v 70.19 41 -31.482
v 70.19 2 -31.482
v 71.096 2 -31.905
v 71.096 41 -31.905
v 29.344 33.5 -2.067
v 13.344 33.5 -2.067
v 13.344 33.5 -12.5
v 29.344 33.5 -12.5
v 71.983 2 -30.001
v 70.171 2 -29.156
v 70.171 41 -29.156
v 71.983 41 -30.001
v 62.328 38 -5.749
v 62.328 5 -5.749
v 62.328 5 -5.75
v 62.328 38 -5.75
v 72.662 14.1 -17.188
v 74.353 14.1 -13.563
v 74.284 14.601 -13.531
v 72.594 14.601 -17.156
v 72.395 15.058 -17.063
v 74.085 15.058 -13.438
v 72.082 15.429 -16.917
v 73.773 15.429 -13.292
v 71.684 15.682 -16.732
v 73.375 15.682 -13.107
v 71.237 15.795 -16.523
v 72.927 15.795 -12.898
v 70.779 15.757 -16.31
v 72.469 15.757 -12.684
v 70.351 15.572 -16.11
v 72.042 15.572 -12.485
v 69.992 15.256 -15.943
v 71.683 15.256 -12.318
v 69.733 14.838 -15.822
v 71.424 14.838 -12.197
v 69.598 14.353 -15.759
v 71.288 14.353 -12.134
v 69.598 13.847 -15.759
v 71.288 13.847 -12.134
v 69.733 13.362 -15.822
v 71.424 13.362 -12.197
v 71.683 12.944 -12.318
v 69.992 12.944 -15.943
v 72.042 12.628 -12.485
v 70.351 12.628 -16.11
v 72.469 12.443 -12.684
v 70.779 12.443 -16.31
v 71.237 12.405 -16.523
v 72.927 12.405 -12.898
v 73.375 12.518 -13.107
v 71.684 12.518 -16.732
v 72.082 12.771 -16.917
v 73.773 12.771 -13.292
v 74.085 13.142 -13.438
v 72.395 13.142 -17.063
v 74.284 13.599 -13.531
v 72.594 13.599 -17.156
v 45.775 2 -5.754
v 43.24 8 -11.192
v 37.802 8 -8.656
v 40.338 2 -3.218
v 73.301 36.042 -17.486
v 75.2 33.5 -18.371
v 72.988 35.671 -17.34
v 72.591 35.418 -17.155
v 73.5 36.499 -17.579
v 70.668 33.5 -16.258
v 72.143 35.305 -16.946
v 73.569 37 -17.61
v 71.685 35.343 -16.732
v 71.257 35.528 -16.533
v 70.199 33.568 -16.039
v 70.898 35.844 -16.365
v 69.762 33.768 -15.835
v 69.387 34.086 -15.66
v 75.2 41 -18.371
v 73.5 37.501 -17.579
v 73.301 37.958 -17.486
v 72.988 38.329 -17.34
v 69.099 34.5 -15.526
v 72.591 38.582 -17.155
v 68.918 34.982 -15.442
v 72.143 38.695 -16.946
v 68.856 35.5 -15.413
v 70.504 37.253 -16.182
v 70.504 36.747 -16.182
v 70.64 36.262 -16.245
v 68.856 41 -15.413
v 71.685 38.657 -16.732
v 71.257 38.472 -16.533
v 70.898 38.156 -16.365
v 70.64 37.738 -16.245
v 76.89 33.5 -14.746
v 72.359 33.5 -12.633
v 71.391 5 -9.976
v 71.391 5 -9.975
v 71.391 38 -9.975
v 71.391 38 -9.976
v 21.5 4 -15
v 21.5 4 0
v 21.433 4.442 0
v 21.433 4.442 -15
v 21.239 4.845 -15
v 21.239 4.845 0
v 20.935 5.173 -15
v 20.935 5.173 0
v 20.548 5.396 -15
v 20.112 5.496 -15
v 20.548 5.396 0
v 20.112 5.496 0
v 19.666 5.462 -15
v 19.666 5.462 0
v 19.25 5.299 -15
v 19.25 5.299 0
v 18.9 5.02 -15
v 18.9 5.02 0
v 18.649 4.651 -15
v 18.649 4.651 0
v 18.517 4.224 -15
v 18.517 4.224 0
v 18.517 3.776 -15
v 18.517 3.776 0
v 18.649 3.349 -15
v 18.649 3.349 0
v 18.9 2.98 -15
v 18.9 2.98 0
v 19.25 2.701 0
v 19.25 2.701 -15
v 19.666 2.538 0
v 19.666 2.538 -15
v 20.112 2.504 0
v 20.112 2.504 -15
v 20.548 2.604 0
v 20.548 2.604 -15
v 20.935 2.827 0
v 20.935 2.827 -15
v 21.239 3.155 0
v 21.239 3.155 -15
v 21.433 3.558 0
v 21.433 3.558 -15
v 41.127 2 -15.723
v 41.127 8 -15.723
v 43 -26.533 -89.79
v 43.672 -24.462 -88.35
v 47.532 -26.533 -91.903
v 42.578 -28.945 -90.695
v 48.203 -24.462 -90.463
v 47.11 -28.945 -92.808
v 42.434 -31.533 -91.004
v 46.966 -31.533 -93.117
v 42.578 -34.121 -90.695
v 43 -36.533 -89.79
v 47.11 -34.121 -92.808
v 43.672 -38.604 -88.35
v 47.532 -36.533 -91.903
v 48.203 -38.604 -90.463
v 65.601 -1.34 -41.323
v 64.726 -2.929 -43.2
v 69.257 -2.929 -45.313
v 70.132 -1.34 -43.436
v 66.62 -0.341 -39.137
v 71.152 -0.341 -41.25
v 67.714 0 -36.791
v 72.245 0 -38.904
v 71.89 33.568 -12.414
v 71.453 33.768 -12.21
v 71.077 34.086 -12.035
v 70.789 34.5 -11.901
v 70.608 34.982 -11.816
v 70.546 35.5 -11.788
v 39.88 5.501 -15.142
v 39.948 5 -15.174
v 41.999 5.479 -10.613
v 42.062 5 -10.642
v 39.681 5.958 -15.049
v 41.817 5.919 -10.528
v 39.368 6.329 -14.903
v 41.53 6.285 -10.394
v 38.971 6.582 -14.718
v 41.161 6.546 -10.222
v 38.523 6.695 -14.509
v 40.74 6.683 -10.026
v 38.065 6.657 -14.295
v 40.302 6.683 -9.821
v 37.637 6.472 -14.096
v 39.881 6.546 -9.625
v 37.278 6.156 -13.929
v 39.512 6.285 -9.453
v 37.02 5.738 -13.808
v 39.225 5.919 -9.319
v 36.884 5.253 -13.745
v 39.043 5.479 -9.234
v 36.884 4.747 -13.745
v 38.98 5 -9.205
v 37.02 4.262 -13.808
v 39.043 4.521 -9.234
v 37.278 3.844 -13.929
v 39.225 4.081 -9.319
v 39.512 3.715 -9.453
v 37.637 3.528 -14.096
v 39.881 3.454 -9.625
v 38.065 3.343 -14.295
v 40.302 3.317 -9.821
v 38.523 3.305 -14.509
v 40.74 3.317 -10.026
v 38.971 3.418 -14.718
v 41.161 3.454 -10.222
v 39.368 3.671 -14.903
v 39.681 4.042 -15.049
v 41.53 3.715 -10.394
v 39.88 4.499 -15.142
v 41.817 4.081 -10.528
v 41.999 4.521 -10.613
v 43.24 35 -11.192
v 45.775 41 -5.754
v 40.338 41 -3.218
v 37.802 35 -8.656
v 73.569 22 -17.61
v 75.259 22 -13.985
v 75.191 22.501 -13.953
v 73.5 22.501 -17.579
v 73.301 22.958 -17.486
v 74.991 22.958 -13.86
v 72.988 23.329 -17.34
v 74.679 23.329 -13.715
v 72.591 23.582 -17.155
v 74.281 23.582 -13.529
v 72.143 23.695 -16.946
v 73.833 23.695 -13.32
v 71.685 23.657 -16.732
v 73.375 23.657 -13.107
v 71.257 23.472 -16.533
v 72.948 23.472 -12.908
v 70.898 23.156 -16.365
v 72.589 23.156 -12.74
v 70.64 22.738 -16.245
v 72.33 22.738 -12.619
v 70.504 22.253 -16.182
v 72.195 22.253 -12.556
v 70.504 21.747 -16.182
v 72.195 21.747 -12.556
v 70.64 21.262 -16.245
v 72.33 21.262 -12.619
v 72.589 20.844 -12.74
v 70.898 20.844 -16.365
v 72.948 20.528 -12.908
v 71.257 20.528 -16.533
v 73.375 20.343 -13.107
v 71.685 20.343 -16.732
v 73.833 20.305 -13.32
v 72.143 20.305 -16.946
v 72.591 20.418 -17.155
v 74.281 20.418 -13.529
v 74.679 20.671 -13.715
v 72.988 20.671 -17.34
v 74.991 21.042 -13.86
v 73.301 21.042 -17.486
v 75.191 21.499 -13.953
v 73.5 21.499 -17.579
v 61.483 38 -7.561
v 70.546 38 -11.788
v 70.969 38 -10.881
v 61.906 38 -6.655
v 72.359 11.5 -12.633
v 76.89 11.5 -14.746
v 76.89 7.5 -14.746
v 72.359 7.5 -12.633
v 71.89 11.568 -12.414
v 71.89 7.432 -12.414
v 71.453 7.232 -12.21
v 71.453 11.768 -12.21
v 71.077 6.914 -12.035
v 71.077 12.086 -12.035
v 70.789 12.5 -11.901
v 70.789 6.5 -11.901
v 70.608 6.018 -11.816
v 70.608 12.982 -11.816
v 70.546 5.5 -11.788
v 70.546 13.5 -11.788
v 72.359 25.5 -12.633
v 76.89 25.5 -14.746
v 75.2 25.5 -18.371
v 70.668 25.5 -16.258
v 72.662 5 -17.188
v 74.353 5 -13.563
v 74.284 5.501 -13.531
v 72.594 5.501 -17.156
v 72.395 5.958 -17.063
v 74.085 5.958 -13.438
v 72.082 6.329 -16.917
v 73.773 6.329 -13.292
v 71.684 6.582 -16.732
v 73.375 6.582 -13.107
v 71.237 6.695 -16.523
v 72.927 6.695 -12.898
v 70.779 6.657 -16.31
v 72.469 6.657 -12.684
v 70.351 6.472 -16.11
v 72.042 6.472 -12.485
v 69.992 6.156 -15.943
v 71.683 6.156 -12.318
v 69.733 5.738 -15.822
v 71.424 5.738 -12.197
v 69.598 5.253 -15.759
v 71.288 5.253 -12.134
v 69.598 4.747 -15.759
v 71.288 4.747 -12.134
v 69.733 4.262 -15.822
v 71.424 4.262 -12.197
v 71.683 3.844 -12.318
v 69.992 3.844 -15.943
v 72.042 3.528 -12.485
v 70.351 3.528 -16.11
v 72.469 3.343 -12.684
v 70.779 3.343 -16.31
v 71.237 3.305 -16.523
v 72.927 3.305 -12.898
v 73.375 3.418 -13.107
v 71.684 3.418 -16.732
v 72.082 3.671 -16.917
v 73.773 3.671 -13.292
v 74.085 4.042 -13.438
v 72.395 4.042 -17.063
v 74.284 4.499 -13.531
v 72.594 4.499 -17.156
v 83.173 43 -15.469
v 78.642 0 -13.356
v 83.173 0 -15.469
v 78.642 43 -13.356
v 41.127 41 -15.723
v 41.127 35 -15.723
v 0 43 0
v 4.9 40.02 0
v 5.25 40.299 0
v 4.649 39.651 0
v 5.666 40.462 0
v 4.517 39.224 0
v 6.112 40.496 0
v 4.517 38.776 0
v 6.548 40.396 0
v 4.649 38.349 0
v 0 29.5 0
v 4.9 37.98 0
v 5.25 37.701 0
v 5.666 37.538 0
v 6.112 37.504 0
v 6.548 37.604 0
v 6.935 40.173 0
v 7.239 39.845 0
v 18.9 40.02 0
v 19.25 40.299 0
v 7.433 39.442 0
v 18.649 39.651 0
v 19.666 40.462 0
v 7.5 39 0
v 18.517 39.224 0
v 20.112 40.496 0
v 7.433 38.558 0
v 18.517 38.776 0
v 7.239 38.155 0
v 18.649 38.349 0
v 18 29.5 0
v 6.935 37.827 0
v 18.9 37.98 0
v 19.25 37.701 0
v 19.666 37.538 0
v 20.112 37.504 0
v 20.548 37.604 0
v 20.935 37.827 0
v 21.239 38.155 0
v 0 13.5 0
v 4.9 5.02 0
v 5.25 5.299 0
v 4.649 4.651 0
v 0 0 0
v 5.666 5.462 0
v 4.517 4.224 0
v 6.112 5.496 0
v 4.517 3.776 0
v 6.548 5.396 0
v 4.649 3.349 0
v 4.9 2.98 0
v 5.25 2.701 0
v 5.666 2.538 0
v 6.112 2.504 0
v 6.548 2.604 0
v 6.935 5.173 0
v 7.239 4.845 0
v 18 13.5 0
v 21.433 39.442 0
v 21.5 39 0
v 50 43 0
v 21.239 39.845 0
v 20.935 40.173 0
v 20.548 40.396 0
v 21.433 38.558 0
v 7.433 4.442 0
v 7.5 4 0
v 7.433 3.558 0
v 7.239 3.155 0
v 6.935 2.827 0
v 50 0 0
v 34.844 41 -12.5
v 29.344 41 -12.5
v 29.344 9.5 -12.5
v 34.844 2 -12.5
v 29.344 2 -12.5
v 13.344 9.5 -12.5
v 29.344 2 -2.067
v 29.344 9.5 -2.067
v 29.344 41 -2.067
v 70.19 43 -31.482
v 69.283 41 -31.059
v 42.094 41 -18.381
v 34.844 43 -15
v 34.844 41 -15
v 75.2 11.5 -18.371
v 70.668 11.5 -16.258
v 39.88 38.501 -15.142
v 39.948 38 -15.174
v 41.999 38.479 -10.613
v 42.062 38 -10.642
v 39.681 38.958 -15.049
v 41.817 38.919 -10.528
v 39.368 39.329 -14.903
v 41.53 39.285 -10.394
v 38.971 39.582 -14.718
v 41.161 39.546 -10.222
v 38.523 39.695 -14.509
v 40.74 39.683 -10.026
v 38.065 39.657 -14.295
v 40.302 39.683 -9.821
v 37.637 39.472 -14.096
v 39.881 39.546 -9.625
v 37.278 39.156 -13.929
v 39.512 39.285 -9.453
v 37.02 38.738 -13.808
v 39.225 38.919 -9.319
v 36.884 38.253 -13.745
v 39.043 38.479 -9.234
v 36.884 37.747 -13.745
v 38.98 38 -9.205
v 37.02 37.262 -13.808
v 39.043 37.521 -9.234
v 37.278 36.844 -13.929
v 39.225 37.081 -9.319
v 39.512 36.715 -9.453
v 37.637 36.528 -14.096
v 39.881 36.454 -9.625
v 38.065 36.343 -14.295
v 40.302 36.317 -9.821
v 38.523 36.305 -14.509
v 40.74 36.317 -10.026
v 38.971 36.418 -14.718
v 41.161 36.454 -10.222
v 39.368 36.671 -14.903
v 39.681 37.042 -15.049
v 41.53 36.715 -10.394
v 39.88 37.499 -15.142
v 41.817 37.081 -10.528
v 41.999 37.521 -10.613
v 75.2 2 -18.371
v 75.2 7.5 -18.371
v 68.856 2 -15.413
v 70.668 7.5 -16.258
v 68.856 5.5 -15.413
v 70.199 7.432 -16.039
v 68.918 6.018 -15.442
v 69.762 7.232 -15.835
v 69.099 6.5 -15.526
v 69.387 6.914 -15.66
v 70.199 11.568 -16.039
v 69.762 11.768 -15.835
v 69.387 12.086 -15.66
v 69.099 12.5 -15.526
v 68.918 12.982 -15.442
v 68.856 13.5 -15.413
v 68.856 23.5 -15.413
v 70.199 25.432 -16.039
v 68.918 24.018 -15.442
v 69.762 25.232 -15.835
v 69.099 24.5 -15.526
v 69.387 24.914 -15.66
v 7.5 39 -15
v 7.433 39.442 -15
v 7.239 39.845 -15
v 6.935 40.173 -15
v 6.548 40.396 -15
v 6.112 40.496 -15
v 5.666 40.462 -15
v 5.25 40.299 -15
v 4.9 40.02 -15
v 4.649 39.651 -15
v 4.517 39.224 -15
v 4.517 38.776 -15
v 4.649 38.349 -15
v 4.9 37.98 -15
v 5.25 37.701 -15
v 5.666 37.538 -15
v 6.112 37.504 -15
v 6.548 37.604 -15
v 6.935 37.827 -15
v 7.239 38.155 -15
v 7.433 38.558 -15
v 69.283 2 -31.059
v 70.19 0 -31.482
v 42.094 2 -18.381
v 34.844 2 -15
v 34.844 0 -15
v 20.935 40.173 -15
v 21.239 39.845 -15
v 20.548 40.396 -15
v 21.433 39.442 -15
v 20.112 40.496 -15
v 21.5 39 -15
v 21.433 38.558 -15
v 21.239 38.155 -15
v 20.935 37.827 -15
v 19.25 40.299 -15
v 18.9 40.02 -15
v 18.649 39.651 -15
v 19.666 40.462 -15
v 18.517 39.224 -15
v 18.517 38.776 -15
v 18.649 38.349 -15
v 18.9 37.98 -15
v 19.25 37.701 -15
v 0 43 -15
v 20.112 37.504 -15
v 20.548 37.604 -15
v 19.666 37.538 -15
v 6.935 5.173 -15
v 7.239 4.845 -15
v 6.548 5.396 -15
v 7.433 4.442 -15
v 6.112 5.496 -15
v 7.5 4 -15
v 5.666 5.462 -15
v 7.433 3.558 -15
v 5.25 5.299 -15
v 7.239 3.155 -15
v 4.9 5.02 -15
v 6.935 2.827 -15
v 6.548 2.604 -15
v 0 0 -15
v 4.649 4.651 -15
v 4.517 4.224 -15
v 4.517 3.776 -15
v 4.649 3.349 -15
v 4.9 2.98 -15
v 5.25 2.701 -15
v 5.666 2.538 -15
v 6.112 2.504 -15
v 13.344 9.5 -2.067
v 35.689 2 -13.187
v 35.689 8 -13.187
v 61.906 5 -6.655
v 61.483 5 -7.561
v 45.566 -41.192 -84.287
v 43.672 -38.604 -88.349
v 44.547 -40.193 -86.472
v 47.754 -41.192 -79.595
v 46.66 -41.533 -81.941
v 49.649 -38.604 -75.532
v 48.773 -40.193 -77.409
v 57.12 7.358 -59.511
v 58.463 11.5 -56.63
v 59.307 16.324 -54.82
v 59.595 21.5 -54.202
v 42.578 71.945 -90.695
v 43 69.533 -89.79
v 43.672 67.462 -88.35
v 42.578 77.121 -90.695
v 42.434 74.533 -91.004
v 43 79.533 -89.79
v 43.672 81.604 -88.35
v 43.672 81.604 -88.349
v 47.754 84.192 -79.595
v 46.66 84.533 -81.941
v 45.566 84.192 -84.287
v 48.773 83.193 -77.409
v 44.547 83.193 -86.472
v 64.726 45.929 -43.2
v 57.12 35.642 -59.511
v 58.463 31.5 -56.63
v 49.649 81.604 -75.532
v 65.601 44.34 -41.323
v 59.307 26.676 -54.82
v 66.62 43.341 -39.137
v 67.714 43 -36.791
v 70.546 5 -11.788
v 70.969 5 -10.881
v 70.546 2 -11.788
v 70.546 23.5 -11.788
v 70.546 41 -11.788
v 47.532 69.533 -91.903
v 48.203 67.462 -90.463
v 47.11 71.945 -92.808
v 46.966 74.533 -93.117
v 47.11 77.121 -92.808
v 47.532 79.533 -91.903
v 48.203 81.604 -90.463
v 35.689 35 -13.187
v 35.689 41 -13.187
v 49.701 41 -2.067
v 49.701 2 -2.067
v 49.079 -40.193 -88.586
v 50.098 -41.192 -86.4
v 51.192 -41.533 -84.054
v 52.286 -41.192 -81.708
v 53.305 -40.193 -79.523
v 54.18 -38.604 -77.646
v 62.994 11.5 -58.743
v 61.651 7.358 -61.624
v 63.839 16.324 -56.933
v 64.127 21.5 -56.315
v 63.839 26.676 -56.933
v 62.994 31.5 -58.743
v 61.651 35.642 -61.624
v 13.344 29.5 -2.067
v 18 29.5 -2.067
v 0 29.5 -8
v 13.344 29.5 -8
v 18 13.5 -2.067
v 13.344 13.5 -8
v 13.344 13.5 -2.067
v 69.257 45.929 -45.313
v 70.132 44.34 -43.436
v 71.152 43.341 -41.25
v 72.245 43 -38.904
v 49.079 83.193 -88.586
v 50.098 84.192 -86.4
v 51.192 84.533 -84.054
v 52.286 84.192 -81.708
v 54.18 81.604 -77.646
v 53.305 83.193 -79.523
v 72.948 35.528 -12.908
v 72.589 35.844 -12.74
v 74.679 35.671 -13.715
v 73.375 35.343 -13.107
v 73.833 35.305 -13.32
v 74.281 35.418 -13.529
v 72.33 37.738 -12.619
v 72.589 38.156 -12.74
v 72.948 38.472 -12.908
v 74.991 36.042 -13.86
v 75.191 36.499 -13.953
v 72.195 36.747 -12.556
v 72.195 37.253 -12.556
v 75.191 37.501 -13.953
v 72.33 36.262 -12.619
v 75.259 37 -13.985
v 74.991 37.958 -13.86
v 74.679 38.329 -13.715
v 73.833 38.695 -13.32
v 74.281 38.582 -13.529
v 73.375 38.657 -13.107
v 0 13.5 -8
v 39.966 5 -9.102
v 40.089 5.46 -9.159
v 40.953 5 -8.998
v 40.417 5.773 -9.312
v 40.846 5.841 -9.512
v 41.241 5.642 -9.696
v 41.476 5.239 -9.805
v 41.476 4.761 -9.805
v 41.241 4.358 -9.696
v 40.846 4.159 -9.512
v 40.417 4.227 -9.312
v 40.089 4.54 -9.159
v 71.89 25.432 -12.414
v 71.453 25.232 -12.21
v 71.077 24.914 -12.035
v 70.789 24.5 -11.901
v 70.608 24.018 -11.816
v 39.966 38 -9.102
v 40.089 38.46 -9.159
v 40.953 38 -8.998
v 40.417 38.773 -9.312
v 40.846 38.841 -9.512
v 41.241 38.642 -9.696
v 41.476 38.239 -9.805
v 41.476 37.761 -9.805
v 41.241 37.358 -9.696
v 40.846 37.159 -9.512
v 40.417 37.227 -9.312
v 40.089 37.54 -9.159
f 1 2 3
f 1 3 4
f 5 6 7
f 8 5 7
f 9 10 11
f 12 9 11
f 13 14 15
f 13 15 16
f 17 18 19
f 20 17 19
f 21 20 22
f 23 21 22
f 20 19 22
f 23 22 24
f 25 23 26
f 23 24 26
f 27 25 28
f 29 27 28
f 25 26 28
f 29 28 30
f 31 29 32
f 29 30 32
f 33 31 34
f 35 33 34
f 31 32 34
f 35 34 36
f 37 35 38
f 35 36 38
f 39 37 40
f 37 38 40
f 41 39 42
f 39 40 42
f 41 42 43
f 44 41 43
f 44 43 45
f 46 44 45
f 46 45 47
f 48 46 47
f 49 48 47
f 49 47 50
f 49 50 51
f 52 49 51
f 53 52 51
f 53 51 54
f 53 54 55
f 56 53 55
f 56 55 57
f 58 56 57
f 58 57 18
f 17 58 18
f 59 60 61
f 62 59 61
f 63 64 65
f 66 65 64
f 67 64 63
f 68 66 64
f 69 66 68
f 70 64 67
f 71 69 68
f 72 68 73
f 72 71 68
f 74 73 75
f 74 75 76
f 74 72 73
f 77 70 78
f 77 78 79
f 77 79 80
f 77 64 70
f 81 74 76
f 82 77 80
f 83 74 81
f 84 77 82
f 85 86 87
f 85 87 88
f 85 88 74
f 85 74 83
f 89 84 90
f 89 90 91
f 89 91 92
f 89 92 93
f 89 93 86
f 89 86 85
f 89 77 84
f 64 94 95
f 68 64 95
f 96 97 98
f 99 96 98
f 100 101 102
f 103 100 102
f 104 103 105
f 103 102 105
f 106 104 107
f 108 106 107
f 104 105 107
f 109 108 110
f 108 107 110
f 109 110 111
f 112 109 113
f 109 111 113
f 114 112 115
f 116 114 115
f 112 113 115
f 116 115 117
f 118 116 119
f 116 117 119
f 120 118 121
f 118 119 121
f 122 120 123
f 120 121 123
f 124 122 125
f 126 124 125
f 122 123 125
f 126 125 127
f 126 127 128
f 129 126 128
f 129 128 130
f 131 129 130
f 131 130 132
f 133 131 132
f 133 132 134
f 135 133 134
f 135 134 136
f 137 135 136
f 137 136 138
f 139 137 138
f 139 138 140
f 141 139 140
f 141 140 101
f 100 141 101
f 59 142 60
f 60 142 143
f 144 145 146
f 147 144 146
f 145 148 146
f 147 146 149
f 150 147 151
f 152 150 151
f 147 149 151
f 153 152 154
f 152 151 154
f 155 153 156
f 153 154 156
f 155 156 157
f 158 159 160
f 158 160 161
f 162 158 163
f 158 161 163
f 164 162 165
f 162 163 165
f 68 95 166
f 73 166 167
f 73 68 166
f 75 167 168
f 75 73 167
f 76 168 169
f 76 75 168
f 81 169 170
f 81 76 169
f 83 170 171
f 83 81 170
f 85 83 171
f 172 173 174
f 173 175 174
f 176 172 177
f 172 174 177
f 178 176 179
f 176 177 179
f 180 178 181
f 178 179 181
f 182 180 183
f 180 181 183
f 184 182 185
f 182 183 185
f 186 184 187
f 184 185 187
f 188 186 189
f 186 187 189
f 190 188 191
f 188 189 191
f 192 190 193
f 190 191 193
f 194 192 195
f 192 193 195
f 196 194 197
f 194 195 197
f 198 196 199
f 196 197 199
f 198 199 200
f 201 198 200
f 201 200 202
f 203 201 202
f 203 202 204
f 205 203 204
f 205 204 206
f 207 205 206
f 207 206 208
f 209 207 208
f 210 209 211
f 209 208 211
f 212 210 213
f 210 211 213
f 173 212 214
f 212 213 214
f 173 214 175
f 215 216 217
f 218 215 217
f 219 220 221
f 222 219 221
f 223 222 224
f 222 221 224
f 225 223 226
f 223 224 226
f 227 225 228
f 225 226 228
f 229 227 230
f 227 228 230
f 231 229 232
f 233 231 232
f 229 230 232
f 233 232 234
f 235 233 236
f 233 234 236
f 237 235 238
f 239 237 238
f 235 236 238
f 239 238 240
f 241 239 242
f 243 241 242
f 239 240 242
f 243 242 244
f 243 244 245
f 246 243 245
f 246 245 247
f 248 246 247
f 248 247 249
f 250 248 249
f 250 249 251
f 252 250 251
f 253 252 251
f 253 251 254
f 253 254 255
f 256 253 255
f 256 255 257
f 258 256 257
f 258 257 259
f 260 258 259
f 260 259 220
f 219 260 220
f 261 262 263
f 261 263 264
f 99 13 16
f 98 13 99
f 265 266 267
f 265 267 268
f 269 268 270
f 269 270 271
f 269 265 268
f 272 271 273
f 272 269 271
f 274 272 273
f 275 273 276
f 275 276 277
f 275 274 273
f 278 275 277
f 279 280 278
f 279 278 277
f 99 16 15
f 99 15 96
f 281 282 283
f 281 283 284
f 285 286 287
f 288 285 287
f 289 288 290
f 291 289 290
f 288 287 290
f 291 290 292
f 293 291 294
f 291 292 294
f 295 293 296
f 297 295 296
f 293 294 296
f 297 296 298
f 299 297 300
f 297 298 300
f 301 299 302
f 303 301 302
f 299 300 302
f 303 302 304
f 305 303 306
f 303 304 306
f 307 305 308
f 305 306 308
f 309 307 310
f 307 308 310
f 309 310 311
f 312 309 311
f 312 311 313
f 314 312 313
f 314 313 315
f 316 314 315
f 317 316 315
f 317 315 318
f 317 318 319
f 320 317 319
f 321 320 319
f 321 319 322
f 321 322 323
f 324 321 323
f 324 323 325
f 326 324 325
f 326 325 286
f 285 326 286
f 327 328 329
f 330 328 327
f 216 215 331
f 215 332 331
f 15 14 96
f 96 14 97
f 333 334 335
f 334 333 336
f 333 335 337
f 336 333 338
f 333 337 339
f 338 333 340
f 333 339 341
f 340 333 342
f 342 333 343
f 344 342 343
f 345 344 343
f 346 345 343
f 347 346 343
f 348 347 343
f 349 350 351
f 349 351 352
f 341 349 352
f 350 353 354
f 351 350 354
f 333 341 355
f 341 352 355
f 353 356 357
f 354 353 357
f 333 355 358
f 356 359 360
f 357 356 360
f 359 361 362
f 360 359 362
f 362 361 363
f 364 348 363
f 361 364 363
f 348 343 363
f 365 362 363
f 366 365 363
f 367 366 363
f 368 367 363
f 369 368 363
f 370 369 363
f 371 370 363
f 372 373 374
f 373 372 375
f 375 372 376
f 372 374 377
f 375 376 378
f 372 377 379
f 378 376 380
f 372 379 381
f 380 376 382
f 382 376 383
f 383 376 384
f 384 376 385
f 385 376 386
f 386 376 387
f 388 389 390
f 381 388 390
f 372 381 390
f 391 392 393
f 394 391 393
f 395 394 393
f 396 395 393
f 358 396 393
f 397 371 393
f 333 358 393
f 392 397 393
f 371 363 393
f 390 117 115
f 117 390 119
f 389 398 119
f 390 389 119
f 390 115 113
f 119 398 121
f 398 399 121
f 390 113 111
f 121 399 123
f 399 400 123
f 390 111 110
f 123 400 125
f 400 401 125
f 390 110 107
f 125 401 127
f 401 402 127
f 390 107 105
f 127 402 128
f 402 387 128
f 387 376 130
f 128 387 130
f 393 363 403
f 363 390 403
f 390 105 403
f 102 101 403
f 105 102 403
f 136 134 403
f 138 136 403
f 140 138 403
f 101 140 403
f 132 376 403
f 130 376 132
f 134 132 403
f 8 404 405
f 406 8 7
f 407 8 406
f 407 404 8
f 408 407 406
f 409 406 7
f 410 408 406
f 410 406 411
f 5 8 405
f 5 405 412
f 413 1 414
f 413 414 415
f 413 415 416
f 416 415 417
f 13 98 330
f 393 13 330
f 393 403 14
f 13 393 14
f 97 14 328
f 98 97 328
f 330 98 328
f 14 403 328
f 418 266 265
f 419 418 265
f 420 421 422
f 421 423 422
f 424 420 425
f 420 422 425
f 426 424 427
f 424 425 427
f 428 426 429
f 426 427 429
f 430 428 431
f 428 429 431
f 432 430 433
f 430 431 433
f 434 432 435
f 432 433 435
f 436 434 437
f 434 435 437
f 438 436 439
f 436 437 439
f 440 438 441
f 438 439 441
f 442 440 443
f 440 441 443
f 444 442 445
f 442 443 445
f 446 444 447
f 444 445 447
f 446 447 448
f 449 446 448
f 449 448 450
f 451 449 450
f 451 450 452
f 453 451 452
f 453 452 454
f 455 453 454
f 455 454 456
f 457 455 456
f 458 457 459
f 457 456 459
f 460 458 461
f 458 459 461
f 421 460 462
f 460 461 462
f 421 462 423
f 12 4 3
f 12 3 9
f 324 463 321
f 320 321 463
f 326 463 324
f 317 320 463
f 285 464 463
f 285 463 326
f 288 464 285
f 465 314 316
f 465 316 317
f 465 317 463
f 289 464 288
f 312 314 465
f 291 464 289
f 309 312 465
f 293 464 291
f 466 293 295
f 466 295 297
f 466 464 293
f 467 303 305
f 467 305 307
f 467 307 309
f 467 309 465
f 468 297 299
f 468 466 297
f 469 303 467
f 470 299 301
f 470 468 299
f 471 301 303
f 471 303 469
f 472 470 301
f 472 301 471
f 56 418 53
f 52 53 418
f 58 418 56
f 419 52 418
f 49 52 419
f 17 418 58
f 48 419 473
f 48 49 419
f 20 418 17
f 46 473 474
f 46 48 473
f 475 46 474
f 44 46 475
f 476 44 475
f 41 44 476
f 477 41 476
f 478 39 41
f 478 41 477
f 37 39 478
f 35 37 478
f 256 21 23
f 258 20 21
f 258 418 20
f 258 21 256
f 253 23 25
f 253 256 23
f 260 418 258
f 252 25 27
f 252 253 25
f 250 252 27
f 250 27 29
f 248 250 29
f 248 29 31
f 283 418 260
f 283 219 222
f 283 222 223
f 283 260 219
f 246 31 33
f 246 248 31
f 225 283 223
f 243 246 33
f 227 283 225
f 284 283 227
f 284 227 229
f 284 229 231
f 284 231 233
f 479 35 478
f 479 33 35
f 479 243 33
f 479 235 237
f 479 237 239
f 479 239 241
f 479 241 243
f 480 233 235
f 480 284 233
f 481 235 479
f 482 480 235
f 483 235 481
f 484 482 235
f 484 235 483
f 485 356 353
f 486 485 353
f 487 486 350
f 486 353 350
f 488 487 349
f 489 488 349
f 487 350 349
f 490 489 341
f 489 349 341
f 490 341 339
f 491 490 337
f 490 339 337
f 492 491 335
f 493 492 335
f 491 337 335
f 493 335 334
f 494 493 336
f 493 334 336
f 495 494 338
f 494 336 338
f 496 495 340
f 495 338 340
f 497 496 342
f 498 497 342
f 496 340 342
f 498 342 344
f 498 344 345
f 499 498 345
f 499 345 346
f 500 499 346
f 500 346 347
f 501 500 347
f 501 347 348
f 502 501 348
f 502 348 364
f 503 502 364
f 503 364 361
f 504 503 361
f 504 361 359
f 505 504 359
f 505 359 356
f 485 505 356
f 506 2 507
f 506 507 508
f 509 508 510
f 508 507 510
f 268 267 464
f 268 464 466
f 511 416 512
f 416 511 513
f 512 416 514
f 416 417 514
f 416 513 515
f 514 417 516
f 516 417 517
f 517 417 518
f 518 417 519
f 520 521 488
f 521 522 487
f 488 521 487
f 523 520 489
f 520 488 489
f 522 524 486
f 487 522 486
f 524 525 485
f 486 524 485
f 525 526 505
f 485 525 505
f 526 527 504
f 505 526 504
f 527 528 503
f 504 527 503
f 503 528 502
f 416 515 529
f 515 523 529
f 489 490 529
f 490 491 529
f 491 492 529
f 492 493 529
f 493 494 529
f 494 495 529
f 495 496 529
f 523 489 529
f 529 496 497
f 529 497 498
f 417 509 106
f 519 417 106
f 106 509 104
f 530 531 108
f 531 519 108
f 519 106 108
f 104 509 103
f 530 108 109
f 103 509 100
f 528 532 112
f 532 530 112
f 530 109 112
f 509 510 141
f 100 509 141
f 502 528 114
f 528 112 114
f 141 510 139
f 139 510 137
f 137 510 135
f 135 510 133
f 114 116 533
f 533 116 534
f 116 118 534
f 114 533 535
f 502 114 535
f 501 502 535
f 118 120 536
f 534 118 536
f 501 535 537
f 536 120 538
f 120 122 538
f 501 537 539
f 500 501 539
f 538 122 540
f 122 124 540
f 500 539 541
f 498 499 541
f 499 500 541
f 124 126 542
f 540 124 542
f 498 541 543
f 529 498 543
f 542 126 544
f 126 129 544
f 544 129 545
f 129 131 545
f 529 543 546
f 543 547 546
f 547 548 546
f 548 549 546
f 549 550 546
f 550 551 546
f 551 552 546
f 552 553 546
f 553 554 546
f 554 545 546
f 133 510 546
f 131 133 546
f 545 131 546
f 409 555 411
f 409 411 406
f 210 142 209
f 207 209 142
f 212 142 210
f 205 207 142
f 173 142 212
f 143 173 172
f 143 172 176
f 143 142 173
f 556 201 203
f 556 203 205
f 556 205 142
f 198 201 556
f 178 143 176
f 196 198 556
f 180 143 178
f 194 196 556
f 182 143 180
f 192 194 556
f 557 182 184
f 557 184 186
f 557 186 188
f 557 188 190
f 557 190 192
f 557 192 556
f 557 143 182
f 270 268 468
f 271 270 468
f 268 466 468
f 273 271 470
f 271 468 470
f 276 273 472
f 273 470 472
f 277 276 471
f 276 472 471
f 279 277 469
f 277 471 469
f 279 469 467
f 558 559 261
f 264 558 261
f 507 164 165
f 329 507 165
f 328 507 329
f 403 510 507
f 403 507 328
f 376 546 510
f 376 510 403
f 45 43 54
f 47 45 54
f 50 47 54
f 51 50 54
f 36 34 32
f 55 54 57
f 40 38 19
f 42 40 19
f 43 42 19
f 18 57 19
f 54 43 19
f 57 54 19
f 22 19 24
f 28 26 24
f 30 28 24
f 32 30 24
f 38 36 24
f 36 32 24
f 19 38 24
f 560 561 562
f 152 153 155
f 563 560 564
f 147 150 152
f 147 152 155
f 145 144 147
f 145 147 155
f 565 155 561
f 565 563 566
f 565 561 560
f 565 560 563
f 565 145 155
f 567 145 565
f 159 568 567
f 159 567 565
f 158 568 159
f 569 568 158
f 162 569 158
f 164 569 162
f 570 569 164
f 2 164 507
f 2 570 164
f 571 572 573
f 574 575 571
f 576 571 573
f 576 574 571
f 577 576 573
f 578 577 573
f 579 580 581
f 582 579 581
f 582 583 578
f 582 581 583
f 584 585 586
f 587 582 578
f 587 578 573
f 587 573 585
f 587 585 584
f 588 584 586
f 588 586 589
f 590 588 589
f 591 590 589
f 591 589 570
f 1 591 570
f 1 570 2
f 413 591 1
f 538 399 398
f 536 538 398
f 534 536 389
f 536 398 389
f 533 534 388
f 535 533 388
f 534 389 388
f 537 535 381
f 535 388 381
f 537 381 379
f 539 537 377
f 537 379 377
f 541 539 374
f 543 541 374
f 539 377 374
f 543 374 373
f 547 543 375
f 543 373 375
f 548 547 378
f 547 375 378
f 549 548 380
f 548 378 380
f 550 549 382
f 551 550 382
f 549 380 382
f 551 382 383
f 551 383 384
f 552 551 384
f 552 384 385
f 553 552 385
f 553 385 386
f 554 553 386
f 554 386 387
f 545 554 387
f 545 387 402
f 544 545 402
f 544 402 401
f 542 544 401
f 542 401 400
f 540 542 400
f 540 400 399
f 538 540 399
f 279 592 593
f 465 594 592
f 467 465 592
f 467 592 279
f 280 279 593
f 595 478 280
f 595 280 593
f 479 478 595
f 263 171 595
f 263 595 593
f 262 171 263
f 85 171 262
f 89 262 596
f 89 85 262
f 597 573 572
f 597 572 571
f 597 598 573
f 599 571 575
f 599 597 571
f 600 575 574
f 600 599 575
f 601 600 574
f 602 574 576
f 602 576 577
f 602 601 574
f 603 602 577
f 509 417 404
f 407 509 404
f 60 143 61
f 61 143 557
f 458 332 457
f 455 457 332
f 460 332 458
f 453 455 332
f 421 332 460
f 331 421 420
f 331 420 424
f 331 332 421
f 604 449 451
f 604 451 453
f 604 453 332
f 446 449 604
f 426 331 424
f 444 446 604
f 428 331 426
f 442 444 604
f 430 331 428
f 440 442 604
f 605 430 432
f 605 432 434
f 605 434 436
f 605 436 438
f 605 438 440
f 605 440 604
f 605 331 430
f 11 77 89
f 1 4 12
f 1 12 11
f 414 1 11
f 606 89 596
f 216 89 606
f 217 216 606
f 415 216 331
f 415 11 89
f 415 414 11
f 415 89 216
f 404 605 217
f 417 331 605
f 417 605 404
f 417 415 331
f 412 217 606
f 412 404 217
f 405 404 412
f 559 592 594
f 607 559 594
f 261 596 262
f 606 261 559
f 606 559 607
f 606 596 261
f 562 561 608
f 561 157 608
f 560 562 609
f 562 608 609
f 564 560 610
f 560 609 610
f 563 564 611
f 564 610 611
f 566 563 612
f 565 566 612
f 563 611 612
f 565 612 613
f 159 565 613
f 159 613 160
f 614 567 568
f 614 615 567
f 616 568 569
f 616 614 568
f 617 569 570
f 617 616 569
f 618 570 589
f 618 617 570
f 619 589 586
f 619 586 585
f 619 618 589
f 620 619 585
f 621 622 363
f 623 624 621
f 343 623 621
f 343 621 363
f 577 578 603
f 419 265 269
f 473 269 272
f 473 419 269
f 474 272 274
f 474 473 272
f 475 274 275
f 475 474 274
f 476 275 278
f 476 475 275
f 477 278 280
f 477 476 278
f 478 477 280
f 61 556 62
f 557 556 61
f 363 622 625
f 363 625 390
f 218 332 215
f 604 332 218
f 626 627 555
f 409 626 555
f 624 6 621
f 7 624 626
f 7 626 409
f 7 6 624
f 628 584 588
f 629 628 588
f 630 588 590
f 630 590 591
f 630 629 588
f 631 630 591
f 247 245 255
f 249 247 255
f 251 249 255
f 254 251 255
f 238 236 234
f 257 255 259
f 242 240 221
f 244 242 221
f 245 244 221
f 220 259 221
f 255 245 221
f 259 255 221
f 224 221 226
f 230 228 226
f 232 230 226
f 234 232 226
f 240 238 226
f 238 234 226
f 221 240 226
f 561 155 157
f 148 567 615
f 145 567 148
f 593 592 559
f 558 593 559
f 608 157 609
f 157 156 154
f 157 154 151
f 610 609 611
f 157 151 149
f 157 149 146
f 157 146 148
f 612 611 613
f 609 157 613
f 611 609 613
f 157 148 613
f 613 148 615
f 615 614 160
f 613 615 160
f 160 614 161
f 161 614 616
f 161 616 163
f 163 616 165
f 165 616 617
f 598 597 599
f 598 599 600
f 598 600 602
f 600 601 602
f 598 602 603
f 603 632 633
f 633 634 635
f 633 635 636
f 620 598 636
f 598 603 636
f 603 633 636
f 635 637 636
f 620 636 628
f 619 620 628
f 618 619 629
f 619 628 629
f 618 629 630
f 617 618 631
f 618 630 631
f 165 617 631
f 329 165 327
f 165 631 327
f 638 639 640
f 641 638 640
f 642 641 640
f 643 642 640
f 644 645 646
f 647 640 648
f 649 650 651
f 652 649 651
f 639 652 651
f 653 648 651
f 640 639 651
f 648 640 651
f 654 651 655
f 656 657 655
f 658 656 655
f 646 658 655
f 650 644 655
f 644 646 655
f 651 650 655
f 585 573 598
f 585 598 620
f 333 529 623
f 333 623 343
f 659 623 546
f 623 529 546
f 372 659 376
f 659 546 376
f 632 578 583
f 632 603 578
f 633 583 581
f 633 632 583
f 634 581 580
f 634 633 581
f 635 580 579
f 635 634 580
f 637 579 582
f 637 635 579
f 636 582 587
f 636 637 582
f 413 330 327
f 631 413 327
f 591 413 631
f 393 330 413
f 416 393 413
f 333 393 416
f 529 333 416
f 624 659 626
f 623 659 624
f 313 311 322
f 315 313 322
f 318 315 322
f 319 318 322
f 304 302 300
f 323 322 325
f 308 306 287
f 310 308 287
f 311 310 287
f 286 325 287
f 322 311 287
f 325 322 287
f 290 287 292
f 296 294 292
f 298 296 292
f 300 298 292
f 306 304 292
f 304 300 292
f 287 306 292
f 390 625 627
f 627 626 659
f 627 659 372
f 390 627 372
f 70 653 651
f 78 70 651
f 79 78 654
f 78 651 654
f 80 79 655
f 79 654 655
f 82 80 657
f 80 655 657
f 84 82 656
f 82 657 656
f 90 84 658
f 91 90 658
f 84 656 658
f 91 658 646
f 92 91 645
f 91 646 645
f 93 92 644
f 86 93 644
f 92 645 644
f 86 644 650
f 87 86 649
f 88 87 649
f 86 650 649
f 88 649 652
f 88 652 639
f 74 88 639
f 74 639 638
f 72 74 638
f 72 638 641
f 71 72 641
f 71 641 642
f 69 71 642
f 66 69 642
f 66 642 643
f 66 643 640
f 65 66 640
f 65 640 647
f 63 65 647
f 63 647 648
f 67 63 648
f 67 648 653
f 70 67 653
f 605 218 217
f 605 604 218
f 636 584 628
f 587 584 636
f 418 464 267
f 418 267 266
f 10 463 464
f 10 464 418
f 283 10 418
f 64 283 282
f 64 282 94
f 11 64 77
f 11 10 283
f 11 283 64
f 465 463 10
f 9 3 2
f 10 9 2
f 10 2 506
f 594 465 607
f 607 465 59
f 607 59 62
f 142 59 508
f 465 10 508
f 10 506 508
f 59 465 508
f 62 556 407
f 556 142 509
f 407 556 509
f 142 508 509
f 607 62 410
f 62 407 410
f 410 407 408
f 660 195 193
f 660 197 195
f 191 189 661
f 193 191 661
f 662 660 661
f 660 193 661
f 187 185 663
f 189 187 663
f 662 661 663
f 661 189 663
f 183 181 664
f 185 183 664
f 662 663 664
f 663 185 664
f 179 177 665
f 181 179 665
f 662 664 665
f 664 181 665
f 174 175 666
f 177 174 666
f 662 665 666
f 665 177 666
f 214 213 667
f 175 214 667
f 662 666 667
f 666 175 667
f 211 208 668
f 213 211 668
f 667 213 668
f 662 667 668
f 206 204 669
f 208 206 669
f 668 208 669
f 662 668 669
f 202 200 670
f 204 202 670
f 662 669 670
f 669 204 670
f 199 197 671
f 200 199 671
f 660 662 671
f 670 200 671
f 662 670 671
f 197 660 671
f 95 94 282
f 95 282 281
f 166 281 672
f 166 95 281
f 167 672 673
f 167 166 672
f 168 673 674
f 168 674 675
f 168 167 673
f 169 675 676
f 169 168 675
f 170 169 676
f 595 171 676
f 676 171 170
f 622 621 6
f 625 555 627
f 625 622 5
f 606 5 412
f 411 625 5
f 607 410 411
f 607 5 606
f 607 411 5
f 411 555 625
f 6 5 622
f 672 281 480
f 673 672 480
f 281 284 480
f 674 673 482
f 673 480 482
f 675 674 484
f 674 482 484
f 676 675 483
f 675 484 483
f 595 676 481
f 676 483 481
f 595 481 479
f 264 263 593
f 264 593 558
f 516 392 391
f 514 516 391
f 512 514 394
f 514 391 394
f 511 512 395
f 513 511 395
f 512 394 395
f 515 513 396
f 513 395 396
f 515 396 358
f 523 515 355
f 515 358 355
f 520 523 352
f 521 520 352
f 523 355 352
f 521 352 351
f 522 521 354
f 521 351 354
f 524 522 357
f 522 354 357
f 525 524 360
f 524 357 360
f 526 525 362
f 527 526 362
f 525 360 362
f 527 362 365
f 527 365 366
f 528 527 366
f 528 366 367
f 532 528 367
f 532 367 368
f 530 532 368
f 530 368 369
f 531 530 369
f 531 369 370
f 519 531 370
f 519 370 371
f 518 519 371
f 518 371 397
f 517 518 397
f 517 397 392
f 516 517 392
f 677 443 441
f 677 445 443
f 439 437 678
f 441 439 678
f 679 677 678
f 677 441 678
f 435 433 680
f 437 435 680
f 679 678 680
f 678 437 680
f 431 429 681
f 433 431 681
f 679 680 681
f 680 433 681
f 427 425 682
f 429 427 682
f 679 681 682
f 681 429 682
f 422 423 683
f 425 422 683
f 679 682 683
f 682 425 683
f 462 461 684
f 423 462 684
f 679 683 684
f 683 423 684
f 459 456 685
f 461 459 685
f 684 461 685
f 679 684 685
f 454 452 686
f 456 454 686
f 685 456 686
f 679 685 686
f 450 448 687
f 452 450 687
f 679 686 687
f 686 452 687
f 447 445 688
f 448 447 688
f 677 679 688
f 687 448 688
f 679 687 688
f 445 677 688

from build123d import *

# Parameters (mm, degrees)
AUFSATZ_LINEAR_AUSTRAGEN1_DEPTH      = 43
AUFSATZ_LINEAR_AUSTRAGEN2_DEPTH      = 5
SCHNITT_LINEAR_AUSTRAGEN1_REACH      = 157.451
SKIZZE3_R                            = 1.5
SKIZZE4_W                            = 8
SKIZZE4_H                            = 16
SCHNITT_LINEAR_AUSTRAGEN2_DEPTH      = 18
SKIZZE5_W                            = 30
SKIZZE5_H                            = 39
SCHNITT_LINEAR_AUSTRAGEN3_DEPTH      = 18
SKIZZE6_W                            = 7
SKIZZE6_H                            = 7.5
SKIZZE6_H_2                          = 14
SKIZZE6_H_3                          = 5.5
AUFSATZ_LINEAR_AUSTRAGEN3_DEPTH      = 4
VERRUNDUNG1_R                        = 2
F_3_4_3_4_DURCHMESSER_BOHRUNG1_D     = 3.4
F_3_4_3_4_DURCHMESSER_BOHRUNG1_DEPTH = 4
SKIZZE10_W                           = 10
SKIZZE10_H                           = 33
SCHNITT_LINEAR_AUSTRAGEN4_DEPTH      = 1
SKIZZE11_W                           = 10
SKIZZE11_H                           = 33
SCHNITT_LINEAR_AUSTRAGEN5_DEPTH      = 0.001
SCHNITT_LINEAR_AUSTRAGEN7_DEPTH      = 39
SKIZZE15_W                           = 10.432594073
SKIZZE15_H                           = 24
SCHNITT_LINEAR_AUSTRAGEN10_DEPTH     = 16
SKIZZE16_W                           = 2.1
SKIZZE16_H                           = 39
SCHNITT_LINEAR_AUSTRAGEN11_DEPTH     = 2
VERRUNDUNG2_R                        = 20
VERRUNDUNG3_R                        = 10
SKIZZE17_W                           = 6
SKIZZE17_H                           = 6
AUFSATZ_LINEAR_AUSTRAGEN4_DEPTH      = 5
FASE1_SIZE                           = 6
F_3_4_3_4_DURCHMESSER_BOHRUNG2_D     = 3.4
F_3_4_3_4_DURCHMESSER_BOHRUNG2_DEPTH = 5
F_3_4_3_4_DURCHMESSER_BOHRUNG2_TIP   = 1.021463052


with BuildPart() as part:
    # Skizze1 → Aufsatz-Linear austragen1 (new body)
    with BuildSketch(Plane(origin=(0, 0, 0), x_dir=(1, 0, 0), z_dir=(0, 1, 0))):
        Polygon((0, 0), (50, 0), (78.641941074, 13.355956467), (70.189575839, 31.482112208), (34.843572145, 15), (0, 15), align=None)
    extrude(amount=AUFSATZ_LINEAR_AUSTRAGEN1_DEPTH)

    # Skizze2 → Aufsatz-Linear austragen2 (add)
    with BuildSketch(Plane(origin=(69.711631316, 0, -32.507067545), x_dir=(-0.4226182617407004, 0, -0.9063077870366495), z_dir=(0.9063077870366495, 0, -0.4226182617407004))):
        Polygon((-21.130913087, 43), (8.869086913, 43), (54.544231126, 88.675144213), (68.686366749, 74.533008589), (15.65335816, 21.5), (68.686366749, -31.533008589), (54.544231126, -45.675144213), (8.869086913, 0), (-21.130913087, 0), align=None)
    extrude(amount=AUFSATZ_LINEAR_AUSTRAGEN2_DEPTH)

    # Skizze3 → Schnitt-Linear austragen1 (cut, up to next)
    with BuildSketch(Plane.XY, mode=Mode.PRIVATE) as schnitt_linear_austragen1_sk1:
        with Locations((6, 39)):
            Circle(SKIZZE3_R)
    schnitt_linear_austragen1_tool1 = extrude(schnitt_linear_austragen1_sk1.sketch, amount=-SCHNITT_LINEAR_AUSTRAGEN1_REACH, mode=Mode.PRIVATE) & part.part
    # Skizze3 → Schnitt-Linear austragen1 (cut, up to next)
    with BuildSketch(Plane.XY, mode=Mode.PRIVATE) as schnitt_linear_austragen1_sk2:
        with Locations((20, 39)):
            Circle(SKIZZE3_R)
    schnitt_linear_austragen1_tool2 = extrude(schnitt_linear_austragen1_sk2.sketch, amount=-SCHNITT_LINEAR_AUSTRAGEN1_REACH, mode=Mode.PRIVATE) & part.part
    # Skizze3 → Schnitt-Linear austragen1 (cut, up to next)
    with BuildSketch(Plane.XY, mode=Mode.PRIVATE) as schnitt_linear_austragen1_sk3:
        with Locations((6, 4)):
            Circle(SKIZZE3_R)
    schnitt_linear_austragen1_tool3 = extrude(schnitt_linear_austragen1_sk3.sketch, amount=-SCHNITT_LINEAR_AUSTRAGEN1_REACH, mode=Mode.PRIVATE) & part.part
    # Skizze3 → Schnitt-Linear austragen1 (cut, up to next)
    with BuildSketch(Plane.XY, mode=Mode.PRIVATE) as schnitt_linear_austragen1_sk4:
        with Locations((20, 4)):
            Circle(SKIZZE3_R)
    schnitt_linear_austragen1_tool4 = extrude(schnitt_linear_austragen1_sk4.sketch, amount=-SCHNITT_LINEAR_AUSTRAGEN1_REACH, mode=Mode.PRIVATE) & part.part
    add(schnitt_linear_austragen1_tool1.solids().sort_by_distance((6, 39, 0))[0], mode=Mode.SUBTRACT)
    add(schnitt_linear_austragen1_tool2.solids().sort_by_distance((20, 39, 0))[0], mode=Mode.SUBTRACT)
    add(schnitt_linear_austragen1_tool3.solids().sort_by_distance((6, 4, 0))[0], mode=Mode.SUBTRACT)
    add(schnitt_linear_austragen1_tool4.solids().sort_by_distance((20, 4, 0))[0], mode=Mode.SUBTRACT)

    # Skizze4 → Schnitt-Linear austragen2 (cut)
    with BuildSketch(Plane.ZY):
        with Locations((-4, 21.5)):
            Rectangle(SKIZZE4_W, SKIZZE4_H)
    extrude(amount=-SCHNITT_LINEAR_AUSTRAGEN2_DEPTH, mode=Mode.SUBTRACT)

    # Skizze5 → Schnitt-Linear austragen3 (cut)
    with BuildSketch(Plane(origin=(0.477944523, 0, 1.024955337), x_dir=(-0.9063077870366492, 0, 0.4226182617407011), z_dir=(-0.4226182617407011, 0, -0.9063077870366492))):
        with Locations((-60.918274689, 21.5)):
            Rectangle(SKIZZE5_W, SKIZZE5_H)
    extrude(amount=-SCHNITT_LINEAR_AUSTRAGEN3_DEPTH, mode=Mode.SUBTRACT)

    # Skizze6 → Aufsatz-Linear austragen3 (add)
    with BuildSketch(Plane(origin=(8.085073234, 0, 17.338495504), x_dir=(-0.9063077870366492, 0, 0.42261826174070133), z_dir=(-0.42261826174070133, 0, -0.9063077870366492))):
        with Locations((-72.418274689, 37.25)):
            Rectangle(SKIZZE6_W, SKIZZE6_H)
        with Locations((-72.418274689, 18.5)):
            Rectangle(SKIZZE6_W, SKIZZE6_H_2)
        with Locations((-72.418274689, 4.75)):
            Rectangle(SKIZZE6_W, SKIZZE6_H_3)
    extrude(amount=AUFSATZ_LINEAR_AUSTRAGEN3_DEPTH)

    # Verrundung1
    verrundung1_edges = [part.edges().sort_by_distance(p)[0] for p in [
        (69.701005731, 33.5, -13.600241521),
        (69.701005731, 11.5, -13.600241521),
        (69.701005731, 25.5, -13.600241521),
        (69.701005731, 7.5, -13.600241521),
    ]]
    fillet(verrundung1_edges, radius=VERRUNDUNG1_R)

    # Ø3.4 (3.4) Durchmesser Bohrung1
    with Locations(Plane(origin=(6.394600187, 0, 13.713264356), x_dir=(-0.906307787036649, 0, 0.4226182617407016), z_dir=(-0.4226182617407016, 0, -0.906307787036649))):
        with Locations((-72.418274689, 37), (-72.418274689, 22), (-71.418274689, 14.1), (-71.418274689, 5)):
            Hole(F_3_4_3_4_DURCHMESSER_BOHRUNG1_D / 2, depth=F_3_4_3_4_DURCHMESSER_BOHRUNG1_DEPTH)

    # Skizze10 → Schnitt-Linear austragen4 (cut)
    with BuildSketch(Plane(origin=(8.085073234, 0, 17.338495504), x_dir=(-0.9063077870366492, 0, 0.42261826174070133), z_dir=(-0.42261826174070133, 0, -0.9063077870366492))):
        with Locations((-63.918274689, 21.5)):
            Rectangle(SKIZZE10_W, SKIZZE10_H)
    extrude(amount=-SCHNITT_LINEAR_AUSTRAGEN4_DEPTH, mode=Mode.SUBTRACT)

    # Skizze11 → Schnitt-Linear austragen5 (cut)
    with BuildSketch(Plane(origin=(8.930309758, 0, 19.151111078), x_dir=(0.9063077870366492, 0, -0.42261826174070133), z_dir=(0.42261826174070133, 0, 0.9063077870366492))):
        with Locations((63.918274689, 21.5)):
            Rectangle(SKIZZE11_W, SKIZZE11_H)
    extrude(amount=-SCHNITT_LINEAR_AUSTRAGEN5_DEPTH, mode=Mode.SUBTRACT)

    # Skizze12 → Schnitt-Linear austragen7 (cut)
    with BuildSketch(Plane(origin=(0, 2, 0), x_dir=(1, 0, 0), z_dir=(0, 1, 0))):
        Polygon((49.701163152, 2.067405927), (42.094034441, 18.380946094), (34.843572145, 15), (34.843572145, 12.5), (29.343572145, 12.5), (29.343572145, 2.067405927), align=None)
    extrude(amount=SCHNITT_LINEAR_AUSTRAGEN7_DEPTH, mode=Mode.SUBTRACT)

    # Skizze15 → Schnitt-Linear austragen10 (cut)
    with BuildSketch(Plane(origin=(29.343572145, 0, 0), x_dir=(0, 0, -1), z_dir=(1, 0, 0))):
        with Locations((7.283702963, 21.5)):
            Rectangle(SKIZZE15_W, SKIZZE15_H)
    extrude(amount=-SCHNITT_LINEAR_AUSTRAGEN10_DEPTH, mode=Mode.SUBTRACT)

    # Skizze16 → Schnitt-Linear austragen11 (cut)
    with BuildSketch(Plane(origin=(68.805323529, 0, -32.084449283), x_dir=(0.42261826174070133, 0, 0.9063077870366492), z_dir=(-0.9063077870366492, 0, 0.42261826174070133))):
        with Locations((2.180913087, 21.5)):
            Rectangle(SKIZZE16_W, SKIZZE16_H)
    extrude(amount=-SCHNITT_LINEAR_AUSTRAGEN11_DEPTH, mode=Mode.SUBTRACT)

    # Verrundung2
    verrundung2_edges = [part.edges().sort_by_distance(p)[0] for p in [
        (65.362005767, 21.5, -47.750373594),
    ]]
    fillet(verrundung2_edges, radius=VERRUNDUNG2_R)

    # Verrundung3
    verrundung3_edges = [part.edges().sort_by_distance(p)[0] for p in [
        (68.229162689, 43, -41.601735733),
        (68.229162689, 0, -41.601735733),
        (42.949287863, 74.533008589, -95.814602248),
        (48.926012637, 88.675144213, -82.997474607),
        (48.926012637, -45.675144213, -82.997474607),
        (42.949287863, -31.533008589, -95.814602248),
    ]]
    fillet(verrundung3_edges, radius=VERRUNDUNG3_R - 0.0001)  # a hair under: the kernel refuses the full size

    # Skizze17 → Aufsatz-Linear austragen4 (add)
    with BuildSketch(Plane(origin=(1.323181047, 0, 2.837570911), x_dir=(-0.9063077870366492, 0, 0.4226182617407011), z_dir=(-0.4226182617407011, 0, -0.9063077870366492))):
        with Locations((-40.918274689, 38)):
            Rectangle(SKIZZE17_W, SKIZZE17_H)
        with Locations((-40.918274689, 5)):
            Rectangle(SKIZZE17_W, SKIZZE17_H)
    extrude(amount=-AUFSATZ_LINEAR_AUSTRAGEN4_DEPTH)

    # Fase1
    fase1_edges = [part.edges().sort_by_distance(p)[0] for p in [
        (40.520823338, 2, -9.923700276),
        (40.520823338, 41, -9.923700276),
    ]]
    chamfer(fase1_edges, length=FASE1_SIZE - 0.0001)  # a hair under: the kernel refuses the full size

    # Ø3.4 (3.4) Durchmesser Bohrung2
    with Locations(Plane(origin=(1.323181047, 0, 2.837570911), x_dir=(-0.9063077870366492, 0, 0.4226182617407014), z_dir=(-0.42261826174070133, 0, -0.906307787036649))):
        with Locations((-40.918274689, 38), (-40.918274689, 5)):
            Hole(F_3_4_3_4_DURCHMESSER_BOHRUNG2_D / 2, depth=F_3_4_3_4_DURCHMESSER_BOHRUNG2_DEPTH)
            with Locations((0, 0, -(F_3_4_3_4_DURCHMESSER_BOHRUNG2_DEPTH + F_3_4_3_4_DURCHMESSER_BOHRUNG2_TIP / 2))):  # 118° drill point
                Cone(0, F_3_4_3_4_DURCHMESSER_BOHRUNG2_D / 2, F_3_4_3_4_DURCHMESSER_BOHRUNG2_TIP, mode=Mode.SUBTRACT)


solid = part.part
